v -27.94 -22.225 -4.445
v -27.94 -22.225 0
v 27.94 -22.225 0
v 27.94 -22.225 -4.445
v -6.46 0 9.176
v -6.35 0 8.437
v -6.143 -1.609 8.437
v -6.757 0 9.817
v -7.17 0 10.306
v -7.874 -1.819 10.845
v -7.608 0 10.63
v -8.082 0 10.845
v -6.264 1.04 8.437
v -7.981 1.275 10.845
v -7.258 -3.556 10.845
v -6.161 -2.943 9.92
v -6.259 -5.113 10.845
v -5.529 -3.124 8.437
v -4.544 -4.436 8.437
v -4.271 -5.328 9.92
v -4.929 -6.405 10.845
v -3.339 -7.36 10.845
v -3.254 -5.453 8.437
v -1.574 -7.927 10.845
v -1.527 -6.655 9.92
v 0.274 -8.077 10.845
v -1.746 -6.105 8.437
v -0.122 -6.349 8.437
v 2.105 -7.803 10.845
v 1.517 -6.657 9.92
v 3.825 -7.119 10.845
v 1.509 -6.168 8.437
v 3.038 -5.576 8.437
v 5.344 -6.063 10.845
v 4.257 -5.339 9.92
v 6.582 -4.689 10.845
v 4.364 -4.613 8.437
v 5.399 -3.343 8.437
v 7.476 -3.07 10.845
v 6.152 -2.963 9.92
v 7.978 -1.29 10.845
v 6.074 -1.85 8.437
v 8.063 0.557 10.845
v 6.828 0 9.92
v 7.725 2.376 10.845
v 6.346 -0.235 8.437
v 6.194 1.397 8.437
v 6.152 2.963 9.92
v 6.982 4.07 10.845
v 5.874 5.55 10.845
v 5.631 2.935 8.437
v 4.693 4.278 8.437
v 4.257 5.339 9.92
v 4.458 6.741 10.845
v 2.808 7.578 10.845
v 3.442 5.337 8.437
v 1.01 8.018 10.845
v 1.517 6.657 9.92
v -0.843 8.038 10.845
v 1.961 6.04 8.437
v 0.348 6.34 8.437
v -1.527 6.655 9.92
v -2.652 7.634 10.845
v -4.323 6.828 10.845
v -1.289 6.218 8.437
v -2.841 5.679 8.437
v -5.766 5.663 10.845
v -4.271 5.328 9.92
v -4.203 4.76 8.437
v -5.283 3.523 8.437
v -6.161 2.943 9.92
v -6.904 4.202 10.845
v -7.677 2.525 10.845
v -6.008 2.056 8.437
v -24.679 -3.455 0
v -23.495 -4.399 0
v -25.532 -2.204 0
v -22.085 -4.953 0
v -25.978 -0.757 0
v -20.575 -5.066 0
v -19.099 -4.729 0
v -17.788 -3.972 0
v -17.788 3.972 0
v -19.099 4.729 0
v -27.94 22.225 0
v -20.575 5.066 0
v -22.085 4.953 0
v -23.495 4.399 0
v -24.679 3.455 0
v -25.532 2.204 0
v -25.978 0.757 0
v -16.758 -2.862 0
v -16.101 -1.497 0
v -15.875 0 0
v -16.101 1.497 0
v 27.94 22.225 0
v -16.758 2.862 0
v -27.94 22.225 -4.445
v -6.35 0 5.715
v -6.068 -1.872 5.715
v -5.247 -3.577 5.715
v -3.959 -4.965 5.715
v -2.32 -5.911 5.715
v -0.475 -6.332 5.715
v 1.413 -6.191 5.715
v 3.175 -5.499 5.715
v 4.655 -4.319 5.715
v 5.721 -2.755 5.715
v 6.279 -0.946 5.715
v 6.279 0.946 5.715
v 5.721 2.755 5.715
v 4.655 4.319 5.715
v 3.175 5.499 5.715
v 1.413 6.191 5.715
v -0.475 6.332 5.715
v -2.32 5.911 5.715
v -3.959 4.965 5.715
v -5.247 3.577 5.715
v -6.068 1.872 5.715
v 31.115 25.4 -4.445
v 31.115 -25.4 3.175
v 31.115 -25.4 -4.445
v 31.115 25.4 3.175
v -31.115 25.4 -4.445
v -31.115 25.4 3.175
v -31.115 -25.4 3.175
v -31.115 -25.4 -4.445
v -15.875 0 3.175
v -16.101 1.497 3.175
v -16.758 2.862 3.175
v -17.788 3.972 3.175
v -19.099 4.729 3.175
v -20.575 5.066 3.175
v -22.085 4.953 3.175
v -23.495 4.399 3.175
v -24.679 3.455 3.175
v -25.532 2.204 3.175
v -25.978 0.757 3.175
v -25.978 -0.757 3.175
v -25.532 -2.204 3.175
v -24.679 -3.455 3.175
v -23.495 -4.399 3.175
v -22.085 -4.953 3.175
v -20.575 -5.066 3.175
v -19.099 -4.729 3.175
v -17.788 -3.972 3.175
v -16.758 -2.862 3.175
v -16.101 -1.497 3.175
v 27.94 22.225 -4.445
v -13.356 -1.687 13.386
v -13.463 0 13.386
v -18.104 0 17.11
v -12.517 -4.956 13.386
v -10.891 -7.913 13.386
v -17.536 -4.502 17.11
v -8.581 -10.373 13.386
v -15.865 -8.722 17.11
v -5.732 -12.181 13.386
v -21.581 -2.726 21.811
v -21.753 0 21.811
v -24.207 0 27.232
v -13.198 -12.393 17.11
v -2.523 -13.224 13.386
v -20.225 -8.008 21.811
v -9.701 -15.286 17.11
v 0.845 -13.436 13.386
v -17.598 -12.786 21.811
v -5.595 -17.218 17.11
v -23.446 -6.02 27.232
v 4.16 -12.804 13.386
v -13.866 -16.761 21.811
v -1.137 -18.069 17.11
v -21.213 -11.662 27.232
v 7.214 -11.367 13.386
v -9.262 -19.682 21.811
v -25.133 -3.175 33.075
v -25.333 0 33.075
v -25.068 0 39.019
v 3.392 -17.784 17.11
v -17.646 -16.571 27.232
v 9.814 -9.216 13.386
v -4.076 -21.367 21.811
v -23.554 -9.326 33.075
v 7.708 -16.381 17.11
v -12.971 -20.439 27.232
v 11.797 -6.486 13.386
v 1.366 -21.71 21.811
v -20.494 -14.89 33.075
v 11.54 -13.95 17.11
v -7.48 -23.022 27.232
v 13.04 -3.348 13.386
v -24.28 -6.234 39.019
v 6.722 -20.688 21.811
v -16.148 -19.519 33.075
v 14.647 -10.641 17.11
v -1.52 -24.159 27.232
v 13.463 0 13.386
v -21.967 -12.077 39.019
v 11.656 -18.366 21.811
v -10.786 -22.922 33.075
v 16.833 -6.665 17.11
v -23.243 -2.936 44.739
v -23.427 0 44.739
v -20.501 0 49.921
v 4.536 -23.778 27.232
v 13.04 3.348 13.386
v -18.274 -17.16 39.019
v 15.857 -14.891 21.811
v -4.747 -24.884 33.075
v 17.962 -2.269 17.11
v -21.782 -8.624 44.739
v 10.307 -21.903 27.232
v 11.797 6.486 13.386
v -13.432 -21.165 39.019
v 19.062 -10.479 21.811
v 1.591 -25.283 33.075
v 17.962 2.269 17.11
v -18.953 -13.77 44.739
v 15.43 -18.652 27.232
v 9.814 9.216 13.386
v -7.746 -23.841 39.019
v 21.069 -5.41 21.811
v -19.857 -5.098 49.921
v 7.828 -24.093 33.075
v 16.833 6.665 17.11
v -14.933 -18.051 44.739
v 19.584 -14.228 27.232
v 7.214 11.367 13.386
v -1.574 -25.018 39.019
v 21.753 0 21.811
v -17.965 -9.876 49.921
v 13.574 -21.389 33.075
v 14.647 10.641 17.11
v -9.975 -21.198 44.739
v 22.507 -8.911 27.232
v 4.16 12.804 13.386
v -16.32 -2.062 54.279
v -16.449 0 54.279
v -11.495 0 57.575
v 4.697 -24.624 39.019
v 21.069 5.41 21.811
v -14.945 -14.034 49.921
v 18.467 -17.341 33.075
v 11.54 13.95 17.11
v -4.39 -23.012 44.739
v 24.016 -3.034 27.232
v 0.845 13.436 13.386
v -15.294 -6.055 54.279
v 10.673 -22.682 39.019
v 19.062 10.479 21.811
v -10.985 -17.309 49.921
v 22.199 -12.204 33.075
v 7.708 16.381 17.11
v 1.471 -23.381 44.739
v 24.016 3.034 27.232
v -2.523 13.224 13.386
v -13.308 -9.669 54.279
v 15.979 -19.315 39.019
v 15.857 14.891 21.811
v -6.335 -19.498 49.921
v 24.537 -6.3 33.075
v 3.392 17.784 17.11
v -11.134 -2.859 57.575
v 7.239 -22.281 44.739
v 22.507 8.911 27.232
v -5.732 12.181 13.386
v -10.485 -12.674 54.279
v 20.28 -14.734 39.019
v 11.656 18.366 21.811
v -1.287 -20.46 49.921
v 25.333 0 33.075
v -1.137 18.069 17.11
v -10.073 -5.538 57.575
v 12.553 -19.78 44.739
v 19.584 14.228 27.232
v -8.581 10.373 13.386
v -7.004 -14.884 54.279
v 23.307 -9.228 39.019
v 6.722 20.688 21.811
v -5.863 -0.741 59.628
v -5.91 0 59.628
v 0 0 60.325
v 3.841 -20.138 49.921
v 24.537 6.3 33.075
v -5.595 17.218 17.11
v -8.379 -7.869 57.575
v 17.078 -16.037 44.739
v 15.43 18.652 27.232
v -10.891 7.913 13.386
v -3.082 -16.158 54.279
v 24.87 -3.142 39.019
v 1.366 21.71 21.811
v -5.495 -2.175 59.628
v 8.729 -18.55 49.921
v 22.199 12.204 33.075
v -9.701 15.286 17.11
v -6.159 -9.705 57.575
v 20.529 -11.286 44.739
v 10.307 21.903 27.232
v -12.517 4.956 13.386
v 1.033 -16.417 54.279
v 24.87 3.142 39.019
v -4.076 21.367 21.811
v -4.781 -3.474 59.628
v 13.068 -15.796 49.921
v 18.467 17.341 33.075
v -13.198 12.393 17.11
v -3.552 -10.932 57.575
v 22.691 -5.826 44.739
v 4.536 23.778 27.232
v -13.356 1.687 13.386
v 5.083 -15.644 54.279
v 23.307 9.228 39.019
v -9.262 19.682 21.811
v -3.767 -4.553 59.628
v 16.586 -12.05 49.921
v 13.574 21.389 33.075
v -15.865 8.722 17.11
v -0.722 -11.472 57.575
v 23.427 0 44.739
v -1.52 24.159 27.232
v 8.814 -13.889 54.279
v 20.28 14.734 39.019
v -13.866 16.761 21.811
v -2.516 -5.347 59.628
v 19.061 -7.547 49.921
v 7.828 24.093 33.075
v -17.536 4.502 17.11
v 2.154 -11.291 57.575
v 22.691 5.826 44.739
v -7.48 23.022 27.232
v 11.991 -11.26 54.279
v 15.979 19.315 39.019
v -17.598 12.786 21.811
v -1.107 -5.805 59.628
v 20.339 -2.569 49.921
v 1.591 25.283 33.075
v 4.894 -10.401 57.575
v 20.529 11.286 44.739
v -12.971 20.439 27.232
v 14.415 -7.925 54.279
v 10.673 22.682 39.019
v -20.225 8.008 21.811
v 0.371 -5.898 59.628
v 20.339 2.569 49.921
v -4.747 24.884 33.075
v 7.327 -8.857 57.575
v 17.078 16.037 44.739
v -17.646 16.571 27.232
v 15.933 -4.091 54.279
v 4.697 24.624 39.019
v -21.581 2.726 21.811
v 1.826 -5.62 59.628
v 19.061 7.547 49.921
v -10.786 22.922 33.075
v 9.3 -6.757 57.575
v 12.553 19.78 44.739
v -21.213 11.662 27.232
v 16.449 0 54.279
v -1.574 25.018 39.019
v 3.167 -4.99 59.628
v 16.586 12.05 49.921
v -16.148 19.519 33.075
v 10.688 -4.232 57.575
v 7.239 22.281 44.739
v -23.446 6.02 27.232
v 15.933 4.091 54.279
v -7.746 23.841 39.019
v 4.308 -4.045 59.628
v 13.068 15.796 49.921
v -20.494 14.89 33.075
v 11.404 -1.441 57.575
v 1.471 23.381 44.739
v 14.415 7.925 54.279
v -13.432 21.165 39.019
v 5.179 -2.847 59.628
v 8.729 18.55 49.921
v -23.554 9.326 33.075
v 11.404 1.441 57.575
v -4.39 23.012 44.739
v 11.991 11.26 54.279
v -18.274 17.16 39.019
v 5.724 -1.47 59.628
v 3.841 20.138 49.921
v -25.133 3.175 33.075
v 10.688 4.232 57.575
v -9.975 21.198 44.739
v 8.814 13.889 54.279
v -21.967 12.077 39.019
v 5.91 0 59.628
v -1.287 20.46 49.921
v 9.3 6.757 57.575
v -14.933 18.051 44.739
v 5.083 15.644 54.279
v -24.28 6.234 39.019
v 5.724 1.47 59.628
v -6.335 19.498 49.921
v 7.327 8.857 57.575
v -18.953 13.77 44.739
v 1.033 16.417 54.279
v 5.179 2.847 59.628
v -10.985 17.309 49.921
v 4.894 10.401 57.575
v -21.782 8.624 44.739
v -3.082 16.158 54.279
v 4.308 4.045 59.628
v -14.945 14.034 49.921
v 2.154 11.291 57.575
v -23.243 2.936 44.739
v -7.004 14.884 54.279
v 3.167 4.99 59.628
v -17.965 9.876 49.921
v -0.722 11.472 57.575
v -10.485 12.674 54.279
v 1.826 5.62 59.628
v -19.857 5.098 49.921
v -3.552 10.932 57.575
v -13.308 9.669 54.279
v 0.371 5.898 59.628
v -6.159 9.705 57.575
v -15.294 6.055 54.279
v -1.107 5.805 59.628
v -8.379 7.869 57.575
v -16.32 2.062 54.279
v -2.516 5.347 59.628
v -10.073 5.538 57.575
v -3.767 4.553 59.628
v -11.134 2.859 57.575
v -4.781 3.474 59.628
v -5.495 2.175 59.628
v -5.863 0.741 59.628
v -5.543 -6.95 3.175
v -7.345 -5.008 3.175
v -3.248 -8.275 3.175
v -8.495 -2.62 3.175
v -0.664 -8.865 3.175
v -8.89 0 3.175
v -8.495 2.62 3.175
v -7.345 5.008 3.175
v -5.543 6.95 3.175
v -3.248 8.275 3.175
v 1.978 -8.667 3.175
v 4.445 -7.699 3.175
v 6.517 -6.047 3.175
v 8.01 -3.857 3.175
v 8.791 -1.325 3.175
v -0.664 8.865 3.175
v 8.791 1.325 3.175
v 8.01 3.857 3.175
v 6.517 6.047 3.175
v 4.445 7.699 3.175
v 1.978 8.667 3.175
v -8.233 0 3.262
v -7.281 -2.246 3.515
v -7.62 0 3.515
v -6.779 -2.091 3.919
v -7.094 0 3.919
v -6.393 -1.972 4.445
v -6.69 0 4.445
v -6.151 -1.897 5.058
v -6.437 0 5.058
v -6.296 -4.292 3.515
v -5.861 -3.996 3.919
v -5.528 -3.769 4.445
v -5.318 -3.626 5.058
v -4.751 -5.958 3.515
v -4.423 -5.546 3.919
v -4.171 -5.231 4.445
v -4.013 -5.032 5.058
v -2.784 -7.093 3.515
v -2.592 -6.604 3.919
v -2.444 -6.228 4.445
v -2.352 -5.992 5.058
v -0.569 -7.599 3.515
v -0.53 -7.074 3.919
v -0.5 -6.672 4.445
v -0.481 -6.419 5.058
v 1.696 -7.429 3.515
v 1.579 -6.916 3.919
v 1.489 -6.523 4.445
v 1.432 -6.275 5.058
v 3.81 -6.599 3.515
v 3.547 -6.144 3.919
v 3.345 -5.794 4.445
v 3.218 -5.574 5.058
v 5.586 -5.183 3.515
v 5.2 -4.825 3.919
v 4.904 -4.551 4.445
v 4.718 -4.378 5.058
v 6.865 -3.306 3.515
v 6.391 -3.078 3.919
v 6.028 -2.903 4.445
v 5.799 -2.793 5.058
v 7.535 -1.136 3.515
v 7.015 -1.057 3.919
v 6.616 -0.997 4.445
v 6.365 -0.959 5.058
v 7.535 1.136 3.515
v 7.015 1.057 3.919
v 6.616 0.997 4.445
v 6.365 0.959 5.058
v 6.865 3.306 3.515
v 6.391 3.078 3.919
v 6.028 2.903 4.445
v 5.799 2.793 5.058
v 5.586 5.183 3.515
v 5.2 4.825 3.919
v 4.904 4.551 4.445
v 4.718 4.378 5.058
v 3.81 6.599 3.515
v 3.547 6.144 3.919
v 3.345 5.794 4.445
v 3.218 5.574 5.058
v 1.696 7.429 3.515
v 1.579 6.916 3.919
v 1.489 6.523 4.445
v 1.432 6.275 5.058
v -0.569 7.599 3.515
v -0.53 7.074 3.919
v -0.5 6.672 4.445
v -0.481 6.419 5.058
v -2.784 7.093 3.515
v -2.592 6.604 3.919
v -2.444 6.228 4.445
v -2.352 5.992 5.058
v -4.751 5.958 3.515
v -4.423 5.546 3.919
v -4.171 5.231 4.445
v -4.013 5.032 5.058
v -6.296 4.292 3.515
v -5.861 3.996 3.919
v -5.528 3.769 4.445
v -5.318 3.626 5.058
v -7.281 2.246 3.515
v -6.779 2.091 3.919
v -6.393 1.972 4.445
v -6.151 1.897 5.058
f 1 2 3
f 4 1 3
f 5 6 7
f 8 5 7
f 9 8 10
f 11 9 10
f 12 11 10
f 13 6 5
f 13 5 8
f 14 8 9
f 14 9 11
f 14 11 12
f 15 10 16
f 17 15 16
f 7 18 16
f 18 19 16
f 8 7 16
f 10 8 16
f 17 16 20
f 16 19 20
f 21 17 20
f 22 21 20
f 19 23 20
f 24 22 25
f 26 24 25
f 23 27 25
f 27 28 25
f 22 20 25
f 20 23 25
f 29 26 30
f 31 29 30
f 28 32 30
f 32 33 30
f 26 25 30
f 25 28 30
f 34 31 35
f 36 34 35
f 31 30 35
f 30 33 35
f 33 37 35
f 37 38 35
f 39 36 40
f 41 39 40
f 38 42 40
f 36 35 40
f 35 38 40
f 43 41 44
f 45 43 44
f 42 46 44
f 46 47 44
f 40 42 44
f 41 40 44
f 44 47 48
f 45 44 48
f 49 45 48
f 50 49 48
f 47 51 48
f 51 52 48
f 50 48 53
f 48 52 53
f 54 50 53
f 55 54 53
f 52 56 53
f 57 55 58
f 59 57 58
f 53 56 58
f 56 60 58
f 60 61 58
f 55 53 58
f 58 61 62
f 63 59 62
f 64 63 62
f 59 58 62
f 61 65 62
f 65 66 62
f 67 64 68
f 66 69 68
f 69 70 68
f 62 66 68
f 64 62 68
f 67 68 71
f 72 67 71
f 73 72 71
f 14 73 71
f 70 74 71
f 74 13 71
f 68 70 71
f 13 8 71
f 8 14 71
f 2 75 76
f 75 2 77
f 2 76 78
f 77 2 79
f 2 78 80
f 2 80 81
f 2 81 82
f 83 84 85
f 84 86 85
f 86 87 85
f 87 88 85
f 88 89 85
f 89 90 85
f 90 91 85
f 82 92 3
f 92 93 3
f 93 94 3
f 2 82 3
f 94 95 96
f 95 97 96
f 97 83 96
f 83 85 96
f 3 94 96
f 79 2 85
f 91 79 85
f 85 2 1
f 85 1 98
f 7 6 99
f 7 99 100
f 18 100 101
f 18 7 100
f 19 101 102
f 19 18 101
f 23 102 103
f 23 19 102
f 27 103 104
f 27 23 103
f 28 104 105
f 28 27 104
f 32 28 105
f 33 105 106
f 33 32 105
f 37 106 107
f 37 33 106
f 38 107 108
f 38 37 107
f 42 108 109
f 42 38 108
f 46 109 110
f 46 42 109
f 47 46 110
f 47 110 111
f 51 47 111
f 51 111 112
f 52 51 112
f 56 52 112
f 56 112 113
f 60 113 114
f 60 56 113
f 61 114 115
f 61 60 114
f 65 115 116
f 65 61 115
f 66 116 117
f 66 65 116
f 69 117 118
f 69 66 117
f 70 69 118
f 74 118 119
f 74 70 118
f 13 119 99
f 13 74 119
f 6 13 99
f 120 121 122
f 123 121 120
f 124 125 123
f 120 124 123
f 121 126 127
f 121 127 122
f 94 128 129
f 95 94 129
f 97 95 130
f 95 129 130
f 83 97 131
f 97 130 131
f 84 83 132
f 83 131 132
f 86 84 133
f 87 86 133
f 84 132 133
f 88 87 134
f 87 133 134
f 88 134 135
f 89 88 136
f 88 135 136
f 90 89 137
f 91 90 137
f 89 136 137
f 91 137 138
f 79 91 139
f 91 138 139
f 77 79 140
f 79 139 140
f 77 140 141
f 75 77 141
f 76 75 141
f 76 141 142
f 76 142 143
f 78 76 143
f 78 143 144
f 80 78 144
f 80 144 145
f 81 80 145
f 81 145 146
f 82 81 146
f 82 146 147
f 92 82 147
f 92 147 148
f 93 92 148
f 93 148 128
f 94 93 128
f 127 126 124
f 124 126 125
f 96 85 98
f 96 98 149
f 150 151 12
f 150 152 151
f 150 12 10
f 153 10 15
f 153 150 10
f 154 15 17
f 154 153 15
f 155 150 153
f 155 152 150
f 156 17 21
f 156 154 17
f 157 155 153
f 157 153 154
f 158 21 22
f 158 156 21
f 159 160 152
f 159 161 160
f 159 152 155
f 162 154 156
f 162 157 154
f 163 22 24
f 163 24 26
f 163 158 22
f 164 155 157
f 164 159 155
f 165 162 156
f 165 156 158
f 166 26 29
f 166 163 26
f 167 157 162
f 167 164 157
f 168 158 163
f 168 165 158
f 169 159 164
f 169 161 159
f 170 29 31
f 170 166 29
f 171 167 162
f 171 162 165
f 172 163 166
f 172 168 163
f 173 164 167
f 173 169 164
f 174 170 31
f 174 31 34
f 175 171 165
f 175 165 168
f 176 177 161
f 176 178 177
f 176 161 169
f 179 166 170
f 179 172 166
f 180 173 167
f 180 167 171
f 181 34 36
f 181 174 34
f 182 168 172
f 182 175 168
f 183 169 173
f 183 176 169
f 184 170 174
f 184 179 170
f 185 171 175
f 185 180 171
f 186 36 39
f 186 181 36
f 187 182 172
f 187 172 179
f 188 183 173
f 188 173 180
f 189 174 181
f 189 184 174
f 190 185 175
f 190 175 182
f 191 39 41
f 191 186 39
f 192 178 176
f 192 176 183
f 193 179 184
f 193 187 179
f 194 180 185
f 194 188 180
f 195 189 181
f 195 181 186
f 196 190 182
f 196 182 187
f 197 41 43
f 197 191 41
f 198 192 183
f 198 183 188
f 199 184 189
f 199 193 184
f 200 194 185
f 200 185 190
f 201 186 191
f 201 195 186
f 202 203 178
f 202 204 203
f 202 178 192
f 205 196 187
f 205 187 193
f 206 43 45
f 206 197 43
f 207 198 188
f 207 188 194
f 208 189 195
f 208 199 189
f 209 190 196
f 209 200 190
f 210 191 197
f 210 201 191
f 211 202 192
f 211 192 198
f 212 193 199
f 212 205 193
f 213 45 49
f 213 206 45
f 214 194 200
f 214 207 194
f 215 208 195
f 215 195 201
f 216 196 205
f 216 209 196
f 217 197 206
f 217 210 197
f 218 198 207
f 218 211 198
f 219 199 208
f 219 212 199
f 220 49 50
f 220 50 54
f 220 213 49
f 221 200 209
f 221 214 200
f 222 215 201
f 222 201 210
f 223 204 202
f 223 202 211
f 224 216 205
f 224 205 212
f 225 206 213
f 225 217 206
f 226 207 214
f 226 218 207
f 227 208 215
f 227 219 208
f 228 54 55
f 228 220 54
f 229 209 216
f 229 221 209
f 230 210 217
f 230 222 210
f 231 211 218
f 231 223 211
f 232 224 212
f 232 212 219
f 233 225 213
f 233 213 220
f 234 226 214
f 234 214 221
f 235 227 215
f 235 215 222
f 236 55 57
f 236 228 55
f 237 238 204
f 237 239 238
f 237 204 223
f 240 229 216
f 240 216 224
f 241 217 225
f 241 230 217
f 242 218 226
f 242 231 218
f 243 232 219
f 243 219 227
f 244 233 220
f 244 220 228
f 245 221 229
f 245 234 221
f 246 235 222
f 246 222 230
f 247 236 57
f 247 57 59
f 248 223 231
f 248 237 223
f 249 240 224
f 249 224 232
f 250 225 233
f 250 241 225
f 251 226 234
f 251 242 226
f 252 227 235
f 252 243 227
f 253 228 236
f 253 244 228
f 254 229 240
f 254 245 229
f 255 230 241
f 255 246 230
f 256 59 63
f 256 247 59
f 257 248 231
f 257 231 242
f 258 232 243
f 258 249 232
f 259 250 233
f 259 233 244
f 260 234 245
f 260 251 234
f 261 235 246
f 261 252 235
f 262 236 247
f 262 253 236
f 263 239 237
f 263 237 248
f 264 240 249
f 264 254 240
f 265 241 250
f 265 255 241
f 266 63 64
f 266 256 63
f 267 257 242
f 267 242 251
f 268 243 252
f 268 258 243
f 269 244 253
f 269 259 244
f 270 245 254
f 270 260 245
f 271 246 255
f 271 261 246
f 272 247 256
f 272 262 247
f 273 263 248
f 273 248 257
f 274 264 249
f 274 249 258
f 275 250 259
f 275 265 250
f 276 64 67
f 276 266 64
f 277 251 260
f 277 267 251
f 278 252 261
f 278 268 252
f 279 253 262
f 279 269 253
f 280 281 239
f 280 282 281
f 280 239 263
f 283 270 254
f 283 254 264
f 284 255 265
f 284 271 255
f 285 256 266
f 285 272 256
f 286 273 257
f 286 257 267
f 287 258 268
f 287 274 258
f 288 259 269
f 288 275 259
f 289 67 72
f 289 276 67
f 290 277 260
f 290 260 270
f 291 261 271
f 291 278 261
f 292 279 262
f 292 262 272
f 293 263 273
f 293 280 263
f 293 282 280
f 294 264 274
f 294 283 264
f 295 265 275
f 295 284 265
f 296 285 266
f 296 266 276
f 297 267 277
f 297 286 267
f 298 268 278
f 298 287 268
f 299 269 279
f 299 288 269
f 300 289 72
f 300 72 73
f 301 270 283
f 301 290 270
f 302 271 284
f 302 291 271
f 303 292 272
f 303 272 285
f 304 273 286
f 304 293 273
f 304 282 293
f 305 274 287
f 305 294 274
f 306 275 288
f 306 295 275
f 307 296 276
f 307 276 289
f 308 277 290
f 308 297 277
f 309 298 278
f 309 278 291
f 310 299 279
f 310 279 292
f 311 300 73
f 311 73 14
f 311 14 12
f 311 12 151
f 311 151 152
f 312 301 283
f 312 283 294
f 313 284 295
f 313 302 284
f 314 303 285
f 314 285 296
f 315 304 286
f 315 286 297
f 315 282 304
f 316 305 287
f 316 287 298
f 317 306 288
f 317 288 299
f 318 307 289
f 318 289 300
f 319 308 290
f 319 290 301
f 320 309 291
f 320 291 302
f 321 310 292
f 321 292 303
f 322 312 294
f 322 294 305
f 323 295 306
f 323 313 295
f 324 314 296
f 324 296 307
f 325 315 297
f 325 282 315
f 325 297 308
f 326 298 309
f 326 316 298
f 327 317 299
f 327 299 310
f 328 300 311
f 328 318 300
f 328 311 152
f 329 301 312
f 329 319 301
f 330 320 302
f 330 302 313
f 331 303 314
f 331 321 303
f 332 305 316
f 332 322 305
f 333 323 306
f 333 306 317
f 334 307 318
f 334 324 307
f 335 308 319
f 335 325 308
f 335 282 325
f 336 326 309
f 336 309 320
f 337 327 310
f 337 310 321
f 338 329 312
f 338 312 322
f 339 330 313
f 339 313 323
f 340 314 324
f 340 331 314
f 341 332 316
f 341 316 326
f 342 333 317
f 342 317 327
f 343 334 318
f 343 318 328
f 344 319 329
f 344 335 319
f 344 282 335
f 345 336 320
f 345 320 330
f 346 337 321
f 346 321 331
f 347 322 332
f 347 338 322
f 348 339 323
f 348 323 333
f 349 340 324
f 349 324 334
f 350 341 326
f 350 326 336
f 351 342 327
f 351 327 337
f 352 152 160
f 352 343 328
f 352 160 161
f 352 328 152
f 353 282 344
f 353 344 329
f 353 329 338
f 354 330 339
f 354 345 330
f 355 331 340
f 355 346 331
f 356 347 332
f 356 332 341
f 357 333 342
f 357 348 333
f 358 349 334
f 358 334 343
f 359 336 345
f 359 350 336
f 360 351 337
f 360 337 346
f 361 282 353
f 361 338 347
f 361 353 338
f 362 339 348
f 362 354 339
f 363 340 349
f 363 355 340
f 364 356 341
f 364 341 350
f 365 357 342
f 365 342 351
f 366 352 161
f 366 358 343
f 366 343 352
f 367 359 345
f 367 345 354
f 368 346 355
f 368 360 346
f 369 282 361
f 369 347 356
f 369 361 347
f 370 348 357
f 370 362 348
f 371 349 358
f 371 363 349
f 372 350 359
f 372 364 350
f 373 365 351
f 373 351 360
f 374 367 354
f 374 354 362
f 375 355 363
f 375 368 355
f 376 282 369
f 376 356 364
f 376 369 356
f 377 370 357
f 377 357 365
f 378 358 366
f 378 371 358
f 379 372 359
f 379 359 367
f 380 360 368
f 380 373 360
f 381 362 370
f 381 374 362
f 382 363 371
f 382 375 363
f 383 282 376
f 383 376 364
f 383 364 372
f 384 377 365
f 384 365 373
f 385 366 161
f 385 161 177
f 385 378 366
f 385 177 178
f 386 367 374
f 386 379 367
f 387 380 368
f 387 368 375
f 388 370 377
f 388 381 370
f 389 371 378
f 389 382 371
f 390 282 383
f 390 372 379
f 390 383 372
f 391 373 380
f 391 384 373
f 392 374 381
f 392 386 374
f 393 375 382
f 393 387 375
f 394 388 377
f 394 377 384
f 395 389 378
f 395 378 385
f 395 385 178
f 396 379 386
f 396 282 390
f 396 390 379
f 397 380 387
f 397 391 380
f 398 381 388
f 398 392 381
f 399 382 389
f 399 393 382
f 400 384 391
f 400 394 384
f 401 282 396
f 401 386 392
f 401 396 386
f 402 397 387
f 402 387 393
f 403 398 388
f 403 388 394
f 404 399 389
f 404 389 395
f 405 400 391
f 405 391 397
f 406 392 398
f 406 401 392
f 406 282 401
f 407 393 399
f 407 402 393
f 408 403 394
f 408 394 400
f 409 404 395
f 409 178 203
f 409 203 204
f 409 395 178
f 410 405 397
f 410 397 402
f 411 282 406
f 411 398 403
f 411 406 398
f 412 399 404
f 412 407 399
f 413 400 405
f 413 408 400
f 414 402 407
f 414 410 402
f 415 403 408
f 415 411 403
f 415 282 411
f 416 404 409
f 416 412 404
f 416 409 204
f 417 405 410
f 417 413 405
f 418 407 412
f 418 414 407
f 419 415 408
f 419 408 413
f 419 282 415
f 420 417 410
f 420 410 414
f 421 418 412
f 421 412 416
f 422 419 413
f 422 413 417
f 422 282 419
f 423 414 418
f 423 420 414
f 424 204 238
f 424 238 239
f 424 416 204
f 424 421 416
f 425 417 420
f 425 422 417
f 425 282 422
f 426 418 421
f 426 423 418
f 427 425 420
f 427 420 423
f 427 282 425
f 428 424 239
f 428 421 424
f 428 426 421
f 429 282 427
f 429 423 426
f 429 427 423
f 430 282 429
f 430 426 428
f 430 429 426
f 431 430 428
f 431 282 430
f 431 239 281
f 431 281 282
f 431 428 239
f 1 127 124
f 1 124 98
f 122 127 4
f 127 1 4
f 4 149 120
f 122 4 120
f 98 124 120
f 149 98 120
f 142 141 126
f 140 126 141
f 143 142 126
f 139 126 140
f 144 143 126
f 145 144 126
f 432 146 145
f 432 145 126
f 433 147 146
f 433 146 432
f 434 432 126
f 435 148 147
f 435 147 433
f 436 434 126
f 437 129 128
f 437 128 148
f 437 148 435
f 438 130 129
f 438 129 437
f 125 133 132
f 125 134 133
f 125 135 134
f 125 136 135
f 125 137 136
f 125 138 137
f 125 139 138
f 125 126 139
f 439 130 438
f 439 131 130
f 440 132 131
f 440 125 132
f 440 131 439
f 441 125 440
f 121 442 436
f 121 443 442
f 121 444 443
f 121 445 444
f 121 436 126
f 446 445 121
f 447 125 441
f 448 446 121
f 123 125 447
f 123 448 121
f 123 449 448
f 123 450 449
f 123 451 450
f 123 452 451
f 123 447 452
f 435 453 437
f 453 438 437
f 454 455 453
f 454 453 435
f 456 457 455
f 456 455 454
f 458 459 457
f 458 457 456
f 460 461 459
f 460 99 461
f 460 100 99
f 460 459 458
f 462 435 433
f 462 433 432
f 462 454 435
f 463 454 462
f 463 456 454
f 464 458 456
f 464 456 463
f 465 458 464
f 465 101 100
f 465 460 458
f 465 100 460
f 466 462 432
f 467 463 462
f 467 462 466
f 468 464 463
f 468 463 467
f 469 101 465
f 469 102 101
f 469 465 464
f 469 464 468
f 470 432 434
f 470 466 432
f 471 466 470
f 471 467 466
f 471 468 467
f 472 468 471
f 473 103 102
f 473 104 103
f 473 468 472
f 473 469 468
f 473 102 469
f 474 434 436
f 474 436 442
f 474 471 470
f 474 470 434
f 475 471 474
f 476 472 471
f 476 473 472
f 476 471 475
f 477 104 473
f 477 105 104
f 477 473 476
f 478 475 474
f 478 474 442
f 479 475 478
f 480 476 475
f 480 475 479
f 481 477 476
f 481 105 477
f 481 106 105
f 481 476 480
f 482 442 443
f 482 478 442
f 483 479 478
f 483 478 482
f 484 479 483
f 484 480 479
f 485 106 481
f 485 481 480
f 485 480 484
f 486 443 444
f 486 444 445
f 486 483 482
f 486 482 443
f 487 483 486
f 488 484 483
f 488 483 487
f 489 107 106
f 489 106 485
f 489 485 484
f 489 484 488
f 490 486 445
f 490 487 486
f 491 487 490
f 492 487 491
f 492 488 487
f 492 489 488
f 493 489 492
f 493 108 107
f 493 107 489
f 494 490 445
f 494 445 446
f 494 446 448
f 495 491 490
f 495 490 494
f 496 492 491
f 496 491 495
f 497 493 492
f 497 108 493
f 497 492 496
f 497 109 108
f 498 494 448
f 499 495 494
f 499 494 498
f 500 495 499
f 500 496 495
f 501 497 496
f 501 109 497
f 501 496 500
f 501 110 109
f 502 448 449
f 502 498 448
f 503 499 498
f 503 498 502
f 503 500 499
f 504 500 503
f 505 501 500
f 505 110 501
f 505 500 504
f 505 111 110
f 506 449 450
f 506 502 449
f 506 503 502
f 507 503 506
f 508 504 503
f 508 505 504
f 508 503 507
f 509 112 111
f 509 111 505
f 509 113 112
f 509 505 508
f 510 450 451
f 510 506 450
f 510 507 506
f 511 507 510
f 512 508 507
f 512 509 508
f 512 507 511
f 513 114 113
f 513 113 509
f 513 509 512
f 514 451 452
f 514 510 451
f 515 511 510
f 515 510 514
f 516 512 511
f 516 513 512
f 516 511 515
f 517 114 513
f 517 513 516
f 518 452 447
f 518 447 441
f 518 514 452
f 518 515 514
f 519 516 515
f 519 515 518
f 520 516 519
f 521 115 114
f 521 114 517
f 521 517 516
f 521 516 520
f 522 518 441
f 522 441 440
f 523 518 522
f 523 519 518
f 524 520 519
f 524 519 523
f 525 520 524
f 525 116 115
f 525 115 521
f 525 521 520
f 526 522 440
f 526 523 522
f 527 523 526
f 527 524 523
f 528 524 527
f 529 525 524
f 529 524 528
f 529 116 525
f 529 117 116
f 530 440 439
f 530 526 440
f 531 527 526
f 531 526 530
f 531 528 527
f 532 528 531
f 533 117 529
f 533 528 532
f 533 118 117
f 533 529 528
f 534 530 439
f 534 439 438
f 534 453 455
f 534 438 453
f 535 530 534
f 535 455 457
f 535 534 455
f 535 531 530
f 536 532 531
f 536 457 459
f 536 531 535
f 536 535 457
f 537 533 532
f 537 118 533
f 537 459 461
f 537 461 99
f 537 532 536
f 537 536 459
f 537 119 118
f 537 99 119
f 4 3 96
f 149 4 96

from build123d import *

# Parameters (mm, degrees)
SKETCH1_W           = 55.88
SKETCH1_H           = 44.45
BOSS_EXTRUDE1_DEPTH = 3.175
SKETCH2_W           = 62.23
SKETCH2_H           = 50.8
SKETCH2_W_2         = 55.88
SKETCH2_H_2         = 44.45
BOSS_EXTRUDE2_DEPTH = 7.62
FILLET1_R           = 2.54
SKETCH4_R           = 5.08
CUT_EXTRUDE1_DEPTH  = 15.875


with BuildPart() as part:
    # Sketch1 → Boss-Extrude1 (new body)
    with BuildSketch(Plane.XY):
        Rectangle(SKETCH1_W, SKETCH1_H)
    extrude(amount=BOSS_EXTRUDE1_DEPTH)

    # Sketch2 → Boss-Extrude2 (add)
    with BuildSketch(Plane.XY.offset(3.175)):
        Rectangle(SKETCH2_W, SKETCH2_H)
        Rectangle(SKETCH2_W_2, SKETCH2_H_2, mode=Mode.SUBTRACT)
    extrude(amount=-BOSS_EXTRUDE2_DEPTH)

    # Sketch3 → Revolve1 (revolve)
    with BuildSketch(Plane(origin=(0, 0, 0), x_dir=(1, 0, 0), z_dir=(0, 1, 0)), mode=Mode.PRIVATE) as revolve1_sk:
        with BuildLine():
            Line((0, -3.175), (6.35, -3.175))
            Line((6.35, -3.175), (6.35, -10.331555752))
            ThreePointArc((6.35, -10.331555752), (25.197554285, -38.125509029), (0, -60.325))
            Line((0, -60.325), (0, -3.175))
        make_face()
    revolve(revolve1_sk.sketch.rotate(Axis((0, 0, 0), (0, 0, 1)), 180), axis=Axis((0, 0, 0), (0, 0, 1)))

    # Fillet1
    fillet1_edges = [part.edges().sort_by_distance(p)[0] for p in [
        (6.35, 0, 3.175),
        (6.35, 0, 10.331555752),
    ]]
    fillet(fillet1_edges, radius=FILLET1_R)

    # Sketch4 → Cut-Extrude1 (cut)
    with BuildSketch(Plane.XY.offset(3.175)):
        with Locations((-20.955, 0)):
            Circle(SKETCH4_R)
    extrude(amount=-CUT_EXTRUDE1_DEPTH, mode=Mode.SUBTRACT)


solid = part.part
